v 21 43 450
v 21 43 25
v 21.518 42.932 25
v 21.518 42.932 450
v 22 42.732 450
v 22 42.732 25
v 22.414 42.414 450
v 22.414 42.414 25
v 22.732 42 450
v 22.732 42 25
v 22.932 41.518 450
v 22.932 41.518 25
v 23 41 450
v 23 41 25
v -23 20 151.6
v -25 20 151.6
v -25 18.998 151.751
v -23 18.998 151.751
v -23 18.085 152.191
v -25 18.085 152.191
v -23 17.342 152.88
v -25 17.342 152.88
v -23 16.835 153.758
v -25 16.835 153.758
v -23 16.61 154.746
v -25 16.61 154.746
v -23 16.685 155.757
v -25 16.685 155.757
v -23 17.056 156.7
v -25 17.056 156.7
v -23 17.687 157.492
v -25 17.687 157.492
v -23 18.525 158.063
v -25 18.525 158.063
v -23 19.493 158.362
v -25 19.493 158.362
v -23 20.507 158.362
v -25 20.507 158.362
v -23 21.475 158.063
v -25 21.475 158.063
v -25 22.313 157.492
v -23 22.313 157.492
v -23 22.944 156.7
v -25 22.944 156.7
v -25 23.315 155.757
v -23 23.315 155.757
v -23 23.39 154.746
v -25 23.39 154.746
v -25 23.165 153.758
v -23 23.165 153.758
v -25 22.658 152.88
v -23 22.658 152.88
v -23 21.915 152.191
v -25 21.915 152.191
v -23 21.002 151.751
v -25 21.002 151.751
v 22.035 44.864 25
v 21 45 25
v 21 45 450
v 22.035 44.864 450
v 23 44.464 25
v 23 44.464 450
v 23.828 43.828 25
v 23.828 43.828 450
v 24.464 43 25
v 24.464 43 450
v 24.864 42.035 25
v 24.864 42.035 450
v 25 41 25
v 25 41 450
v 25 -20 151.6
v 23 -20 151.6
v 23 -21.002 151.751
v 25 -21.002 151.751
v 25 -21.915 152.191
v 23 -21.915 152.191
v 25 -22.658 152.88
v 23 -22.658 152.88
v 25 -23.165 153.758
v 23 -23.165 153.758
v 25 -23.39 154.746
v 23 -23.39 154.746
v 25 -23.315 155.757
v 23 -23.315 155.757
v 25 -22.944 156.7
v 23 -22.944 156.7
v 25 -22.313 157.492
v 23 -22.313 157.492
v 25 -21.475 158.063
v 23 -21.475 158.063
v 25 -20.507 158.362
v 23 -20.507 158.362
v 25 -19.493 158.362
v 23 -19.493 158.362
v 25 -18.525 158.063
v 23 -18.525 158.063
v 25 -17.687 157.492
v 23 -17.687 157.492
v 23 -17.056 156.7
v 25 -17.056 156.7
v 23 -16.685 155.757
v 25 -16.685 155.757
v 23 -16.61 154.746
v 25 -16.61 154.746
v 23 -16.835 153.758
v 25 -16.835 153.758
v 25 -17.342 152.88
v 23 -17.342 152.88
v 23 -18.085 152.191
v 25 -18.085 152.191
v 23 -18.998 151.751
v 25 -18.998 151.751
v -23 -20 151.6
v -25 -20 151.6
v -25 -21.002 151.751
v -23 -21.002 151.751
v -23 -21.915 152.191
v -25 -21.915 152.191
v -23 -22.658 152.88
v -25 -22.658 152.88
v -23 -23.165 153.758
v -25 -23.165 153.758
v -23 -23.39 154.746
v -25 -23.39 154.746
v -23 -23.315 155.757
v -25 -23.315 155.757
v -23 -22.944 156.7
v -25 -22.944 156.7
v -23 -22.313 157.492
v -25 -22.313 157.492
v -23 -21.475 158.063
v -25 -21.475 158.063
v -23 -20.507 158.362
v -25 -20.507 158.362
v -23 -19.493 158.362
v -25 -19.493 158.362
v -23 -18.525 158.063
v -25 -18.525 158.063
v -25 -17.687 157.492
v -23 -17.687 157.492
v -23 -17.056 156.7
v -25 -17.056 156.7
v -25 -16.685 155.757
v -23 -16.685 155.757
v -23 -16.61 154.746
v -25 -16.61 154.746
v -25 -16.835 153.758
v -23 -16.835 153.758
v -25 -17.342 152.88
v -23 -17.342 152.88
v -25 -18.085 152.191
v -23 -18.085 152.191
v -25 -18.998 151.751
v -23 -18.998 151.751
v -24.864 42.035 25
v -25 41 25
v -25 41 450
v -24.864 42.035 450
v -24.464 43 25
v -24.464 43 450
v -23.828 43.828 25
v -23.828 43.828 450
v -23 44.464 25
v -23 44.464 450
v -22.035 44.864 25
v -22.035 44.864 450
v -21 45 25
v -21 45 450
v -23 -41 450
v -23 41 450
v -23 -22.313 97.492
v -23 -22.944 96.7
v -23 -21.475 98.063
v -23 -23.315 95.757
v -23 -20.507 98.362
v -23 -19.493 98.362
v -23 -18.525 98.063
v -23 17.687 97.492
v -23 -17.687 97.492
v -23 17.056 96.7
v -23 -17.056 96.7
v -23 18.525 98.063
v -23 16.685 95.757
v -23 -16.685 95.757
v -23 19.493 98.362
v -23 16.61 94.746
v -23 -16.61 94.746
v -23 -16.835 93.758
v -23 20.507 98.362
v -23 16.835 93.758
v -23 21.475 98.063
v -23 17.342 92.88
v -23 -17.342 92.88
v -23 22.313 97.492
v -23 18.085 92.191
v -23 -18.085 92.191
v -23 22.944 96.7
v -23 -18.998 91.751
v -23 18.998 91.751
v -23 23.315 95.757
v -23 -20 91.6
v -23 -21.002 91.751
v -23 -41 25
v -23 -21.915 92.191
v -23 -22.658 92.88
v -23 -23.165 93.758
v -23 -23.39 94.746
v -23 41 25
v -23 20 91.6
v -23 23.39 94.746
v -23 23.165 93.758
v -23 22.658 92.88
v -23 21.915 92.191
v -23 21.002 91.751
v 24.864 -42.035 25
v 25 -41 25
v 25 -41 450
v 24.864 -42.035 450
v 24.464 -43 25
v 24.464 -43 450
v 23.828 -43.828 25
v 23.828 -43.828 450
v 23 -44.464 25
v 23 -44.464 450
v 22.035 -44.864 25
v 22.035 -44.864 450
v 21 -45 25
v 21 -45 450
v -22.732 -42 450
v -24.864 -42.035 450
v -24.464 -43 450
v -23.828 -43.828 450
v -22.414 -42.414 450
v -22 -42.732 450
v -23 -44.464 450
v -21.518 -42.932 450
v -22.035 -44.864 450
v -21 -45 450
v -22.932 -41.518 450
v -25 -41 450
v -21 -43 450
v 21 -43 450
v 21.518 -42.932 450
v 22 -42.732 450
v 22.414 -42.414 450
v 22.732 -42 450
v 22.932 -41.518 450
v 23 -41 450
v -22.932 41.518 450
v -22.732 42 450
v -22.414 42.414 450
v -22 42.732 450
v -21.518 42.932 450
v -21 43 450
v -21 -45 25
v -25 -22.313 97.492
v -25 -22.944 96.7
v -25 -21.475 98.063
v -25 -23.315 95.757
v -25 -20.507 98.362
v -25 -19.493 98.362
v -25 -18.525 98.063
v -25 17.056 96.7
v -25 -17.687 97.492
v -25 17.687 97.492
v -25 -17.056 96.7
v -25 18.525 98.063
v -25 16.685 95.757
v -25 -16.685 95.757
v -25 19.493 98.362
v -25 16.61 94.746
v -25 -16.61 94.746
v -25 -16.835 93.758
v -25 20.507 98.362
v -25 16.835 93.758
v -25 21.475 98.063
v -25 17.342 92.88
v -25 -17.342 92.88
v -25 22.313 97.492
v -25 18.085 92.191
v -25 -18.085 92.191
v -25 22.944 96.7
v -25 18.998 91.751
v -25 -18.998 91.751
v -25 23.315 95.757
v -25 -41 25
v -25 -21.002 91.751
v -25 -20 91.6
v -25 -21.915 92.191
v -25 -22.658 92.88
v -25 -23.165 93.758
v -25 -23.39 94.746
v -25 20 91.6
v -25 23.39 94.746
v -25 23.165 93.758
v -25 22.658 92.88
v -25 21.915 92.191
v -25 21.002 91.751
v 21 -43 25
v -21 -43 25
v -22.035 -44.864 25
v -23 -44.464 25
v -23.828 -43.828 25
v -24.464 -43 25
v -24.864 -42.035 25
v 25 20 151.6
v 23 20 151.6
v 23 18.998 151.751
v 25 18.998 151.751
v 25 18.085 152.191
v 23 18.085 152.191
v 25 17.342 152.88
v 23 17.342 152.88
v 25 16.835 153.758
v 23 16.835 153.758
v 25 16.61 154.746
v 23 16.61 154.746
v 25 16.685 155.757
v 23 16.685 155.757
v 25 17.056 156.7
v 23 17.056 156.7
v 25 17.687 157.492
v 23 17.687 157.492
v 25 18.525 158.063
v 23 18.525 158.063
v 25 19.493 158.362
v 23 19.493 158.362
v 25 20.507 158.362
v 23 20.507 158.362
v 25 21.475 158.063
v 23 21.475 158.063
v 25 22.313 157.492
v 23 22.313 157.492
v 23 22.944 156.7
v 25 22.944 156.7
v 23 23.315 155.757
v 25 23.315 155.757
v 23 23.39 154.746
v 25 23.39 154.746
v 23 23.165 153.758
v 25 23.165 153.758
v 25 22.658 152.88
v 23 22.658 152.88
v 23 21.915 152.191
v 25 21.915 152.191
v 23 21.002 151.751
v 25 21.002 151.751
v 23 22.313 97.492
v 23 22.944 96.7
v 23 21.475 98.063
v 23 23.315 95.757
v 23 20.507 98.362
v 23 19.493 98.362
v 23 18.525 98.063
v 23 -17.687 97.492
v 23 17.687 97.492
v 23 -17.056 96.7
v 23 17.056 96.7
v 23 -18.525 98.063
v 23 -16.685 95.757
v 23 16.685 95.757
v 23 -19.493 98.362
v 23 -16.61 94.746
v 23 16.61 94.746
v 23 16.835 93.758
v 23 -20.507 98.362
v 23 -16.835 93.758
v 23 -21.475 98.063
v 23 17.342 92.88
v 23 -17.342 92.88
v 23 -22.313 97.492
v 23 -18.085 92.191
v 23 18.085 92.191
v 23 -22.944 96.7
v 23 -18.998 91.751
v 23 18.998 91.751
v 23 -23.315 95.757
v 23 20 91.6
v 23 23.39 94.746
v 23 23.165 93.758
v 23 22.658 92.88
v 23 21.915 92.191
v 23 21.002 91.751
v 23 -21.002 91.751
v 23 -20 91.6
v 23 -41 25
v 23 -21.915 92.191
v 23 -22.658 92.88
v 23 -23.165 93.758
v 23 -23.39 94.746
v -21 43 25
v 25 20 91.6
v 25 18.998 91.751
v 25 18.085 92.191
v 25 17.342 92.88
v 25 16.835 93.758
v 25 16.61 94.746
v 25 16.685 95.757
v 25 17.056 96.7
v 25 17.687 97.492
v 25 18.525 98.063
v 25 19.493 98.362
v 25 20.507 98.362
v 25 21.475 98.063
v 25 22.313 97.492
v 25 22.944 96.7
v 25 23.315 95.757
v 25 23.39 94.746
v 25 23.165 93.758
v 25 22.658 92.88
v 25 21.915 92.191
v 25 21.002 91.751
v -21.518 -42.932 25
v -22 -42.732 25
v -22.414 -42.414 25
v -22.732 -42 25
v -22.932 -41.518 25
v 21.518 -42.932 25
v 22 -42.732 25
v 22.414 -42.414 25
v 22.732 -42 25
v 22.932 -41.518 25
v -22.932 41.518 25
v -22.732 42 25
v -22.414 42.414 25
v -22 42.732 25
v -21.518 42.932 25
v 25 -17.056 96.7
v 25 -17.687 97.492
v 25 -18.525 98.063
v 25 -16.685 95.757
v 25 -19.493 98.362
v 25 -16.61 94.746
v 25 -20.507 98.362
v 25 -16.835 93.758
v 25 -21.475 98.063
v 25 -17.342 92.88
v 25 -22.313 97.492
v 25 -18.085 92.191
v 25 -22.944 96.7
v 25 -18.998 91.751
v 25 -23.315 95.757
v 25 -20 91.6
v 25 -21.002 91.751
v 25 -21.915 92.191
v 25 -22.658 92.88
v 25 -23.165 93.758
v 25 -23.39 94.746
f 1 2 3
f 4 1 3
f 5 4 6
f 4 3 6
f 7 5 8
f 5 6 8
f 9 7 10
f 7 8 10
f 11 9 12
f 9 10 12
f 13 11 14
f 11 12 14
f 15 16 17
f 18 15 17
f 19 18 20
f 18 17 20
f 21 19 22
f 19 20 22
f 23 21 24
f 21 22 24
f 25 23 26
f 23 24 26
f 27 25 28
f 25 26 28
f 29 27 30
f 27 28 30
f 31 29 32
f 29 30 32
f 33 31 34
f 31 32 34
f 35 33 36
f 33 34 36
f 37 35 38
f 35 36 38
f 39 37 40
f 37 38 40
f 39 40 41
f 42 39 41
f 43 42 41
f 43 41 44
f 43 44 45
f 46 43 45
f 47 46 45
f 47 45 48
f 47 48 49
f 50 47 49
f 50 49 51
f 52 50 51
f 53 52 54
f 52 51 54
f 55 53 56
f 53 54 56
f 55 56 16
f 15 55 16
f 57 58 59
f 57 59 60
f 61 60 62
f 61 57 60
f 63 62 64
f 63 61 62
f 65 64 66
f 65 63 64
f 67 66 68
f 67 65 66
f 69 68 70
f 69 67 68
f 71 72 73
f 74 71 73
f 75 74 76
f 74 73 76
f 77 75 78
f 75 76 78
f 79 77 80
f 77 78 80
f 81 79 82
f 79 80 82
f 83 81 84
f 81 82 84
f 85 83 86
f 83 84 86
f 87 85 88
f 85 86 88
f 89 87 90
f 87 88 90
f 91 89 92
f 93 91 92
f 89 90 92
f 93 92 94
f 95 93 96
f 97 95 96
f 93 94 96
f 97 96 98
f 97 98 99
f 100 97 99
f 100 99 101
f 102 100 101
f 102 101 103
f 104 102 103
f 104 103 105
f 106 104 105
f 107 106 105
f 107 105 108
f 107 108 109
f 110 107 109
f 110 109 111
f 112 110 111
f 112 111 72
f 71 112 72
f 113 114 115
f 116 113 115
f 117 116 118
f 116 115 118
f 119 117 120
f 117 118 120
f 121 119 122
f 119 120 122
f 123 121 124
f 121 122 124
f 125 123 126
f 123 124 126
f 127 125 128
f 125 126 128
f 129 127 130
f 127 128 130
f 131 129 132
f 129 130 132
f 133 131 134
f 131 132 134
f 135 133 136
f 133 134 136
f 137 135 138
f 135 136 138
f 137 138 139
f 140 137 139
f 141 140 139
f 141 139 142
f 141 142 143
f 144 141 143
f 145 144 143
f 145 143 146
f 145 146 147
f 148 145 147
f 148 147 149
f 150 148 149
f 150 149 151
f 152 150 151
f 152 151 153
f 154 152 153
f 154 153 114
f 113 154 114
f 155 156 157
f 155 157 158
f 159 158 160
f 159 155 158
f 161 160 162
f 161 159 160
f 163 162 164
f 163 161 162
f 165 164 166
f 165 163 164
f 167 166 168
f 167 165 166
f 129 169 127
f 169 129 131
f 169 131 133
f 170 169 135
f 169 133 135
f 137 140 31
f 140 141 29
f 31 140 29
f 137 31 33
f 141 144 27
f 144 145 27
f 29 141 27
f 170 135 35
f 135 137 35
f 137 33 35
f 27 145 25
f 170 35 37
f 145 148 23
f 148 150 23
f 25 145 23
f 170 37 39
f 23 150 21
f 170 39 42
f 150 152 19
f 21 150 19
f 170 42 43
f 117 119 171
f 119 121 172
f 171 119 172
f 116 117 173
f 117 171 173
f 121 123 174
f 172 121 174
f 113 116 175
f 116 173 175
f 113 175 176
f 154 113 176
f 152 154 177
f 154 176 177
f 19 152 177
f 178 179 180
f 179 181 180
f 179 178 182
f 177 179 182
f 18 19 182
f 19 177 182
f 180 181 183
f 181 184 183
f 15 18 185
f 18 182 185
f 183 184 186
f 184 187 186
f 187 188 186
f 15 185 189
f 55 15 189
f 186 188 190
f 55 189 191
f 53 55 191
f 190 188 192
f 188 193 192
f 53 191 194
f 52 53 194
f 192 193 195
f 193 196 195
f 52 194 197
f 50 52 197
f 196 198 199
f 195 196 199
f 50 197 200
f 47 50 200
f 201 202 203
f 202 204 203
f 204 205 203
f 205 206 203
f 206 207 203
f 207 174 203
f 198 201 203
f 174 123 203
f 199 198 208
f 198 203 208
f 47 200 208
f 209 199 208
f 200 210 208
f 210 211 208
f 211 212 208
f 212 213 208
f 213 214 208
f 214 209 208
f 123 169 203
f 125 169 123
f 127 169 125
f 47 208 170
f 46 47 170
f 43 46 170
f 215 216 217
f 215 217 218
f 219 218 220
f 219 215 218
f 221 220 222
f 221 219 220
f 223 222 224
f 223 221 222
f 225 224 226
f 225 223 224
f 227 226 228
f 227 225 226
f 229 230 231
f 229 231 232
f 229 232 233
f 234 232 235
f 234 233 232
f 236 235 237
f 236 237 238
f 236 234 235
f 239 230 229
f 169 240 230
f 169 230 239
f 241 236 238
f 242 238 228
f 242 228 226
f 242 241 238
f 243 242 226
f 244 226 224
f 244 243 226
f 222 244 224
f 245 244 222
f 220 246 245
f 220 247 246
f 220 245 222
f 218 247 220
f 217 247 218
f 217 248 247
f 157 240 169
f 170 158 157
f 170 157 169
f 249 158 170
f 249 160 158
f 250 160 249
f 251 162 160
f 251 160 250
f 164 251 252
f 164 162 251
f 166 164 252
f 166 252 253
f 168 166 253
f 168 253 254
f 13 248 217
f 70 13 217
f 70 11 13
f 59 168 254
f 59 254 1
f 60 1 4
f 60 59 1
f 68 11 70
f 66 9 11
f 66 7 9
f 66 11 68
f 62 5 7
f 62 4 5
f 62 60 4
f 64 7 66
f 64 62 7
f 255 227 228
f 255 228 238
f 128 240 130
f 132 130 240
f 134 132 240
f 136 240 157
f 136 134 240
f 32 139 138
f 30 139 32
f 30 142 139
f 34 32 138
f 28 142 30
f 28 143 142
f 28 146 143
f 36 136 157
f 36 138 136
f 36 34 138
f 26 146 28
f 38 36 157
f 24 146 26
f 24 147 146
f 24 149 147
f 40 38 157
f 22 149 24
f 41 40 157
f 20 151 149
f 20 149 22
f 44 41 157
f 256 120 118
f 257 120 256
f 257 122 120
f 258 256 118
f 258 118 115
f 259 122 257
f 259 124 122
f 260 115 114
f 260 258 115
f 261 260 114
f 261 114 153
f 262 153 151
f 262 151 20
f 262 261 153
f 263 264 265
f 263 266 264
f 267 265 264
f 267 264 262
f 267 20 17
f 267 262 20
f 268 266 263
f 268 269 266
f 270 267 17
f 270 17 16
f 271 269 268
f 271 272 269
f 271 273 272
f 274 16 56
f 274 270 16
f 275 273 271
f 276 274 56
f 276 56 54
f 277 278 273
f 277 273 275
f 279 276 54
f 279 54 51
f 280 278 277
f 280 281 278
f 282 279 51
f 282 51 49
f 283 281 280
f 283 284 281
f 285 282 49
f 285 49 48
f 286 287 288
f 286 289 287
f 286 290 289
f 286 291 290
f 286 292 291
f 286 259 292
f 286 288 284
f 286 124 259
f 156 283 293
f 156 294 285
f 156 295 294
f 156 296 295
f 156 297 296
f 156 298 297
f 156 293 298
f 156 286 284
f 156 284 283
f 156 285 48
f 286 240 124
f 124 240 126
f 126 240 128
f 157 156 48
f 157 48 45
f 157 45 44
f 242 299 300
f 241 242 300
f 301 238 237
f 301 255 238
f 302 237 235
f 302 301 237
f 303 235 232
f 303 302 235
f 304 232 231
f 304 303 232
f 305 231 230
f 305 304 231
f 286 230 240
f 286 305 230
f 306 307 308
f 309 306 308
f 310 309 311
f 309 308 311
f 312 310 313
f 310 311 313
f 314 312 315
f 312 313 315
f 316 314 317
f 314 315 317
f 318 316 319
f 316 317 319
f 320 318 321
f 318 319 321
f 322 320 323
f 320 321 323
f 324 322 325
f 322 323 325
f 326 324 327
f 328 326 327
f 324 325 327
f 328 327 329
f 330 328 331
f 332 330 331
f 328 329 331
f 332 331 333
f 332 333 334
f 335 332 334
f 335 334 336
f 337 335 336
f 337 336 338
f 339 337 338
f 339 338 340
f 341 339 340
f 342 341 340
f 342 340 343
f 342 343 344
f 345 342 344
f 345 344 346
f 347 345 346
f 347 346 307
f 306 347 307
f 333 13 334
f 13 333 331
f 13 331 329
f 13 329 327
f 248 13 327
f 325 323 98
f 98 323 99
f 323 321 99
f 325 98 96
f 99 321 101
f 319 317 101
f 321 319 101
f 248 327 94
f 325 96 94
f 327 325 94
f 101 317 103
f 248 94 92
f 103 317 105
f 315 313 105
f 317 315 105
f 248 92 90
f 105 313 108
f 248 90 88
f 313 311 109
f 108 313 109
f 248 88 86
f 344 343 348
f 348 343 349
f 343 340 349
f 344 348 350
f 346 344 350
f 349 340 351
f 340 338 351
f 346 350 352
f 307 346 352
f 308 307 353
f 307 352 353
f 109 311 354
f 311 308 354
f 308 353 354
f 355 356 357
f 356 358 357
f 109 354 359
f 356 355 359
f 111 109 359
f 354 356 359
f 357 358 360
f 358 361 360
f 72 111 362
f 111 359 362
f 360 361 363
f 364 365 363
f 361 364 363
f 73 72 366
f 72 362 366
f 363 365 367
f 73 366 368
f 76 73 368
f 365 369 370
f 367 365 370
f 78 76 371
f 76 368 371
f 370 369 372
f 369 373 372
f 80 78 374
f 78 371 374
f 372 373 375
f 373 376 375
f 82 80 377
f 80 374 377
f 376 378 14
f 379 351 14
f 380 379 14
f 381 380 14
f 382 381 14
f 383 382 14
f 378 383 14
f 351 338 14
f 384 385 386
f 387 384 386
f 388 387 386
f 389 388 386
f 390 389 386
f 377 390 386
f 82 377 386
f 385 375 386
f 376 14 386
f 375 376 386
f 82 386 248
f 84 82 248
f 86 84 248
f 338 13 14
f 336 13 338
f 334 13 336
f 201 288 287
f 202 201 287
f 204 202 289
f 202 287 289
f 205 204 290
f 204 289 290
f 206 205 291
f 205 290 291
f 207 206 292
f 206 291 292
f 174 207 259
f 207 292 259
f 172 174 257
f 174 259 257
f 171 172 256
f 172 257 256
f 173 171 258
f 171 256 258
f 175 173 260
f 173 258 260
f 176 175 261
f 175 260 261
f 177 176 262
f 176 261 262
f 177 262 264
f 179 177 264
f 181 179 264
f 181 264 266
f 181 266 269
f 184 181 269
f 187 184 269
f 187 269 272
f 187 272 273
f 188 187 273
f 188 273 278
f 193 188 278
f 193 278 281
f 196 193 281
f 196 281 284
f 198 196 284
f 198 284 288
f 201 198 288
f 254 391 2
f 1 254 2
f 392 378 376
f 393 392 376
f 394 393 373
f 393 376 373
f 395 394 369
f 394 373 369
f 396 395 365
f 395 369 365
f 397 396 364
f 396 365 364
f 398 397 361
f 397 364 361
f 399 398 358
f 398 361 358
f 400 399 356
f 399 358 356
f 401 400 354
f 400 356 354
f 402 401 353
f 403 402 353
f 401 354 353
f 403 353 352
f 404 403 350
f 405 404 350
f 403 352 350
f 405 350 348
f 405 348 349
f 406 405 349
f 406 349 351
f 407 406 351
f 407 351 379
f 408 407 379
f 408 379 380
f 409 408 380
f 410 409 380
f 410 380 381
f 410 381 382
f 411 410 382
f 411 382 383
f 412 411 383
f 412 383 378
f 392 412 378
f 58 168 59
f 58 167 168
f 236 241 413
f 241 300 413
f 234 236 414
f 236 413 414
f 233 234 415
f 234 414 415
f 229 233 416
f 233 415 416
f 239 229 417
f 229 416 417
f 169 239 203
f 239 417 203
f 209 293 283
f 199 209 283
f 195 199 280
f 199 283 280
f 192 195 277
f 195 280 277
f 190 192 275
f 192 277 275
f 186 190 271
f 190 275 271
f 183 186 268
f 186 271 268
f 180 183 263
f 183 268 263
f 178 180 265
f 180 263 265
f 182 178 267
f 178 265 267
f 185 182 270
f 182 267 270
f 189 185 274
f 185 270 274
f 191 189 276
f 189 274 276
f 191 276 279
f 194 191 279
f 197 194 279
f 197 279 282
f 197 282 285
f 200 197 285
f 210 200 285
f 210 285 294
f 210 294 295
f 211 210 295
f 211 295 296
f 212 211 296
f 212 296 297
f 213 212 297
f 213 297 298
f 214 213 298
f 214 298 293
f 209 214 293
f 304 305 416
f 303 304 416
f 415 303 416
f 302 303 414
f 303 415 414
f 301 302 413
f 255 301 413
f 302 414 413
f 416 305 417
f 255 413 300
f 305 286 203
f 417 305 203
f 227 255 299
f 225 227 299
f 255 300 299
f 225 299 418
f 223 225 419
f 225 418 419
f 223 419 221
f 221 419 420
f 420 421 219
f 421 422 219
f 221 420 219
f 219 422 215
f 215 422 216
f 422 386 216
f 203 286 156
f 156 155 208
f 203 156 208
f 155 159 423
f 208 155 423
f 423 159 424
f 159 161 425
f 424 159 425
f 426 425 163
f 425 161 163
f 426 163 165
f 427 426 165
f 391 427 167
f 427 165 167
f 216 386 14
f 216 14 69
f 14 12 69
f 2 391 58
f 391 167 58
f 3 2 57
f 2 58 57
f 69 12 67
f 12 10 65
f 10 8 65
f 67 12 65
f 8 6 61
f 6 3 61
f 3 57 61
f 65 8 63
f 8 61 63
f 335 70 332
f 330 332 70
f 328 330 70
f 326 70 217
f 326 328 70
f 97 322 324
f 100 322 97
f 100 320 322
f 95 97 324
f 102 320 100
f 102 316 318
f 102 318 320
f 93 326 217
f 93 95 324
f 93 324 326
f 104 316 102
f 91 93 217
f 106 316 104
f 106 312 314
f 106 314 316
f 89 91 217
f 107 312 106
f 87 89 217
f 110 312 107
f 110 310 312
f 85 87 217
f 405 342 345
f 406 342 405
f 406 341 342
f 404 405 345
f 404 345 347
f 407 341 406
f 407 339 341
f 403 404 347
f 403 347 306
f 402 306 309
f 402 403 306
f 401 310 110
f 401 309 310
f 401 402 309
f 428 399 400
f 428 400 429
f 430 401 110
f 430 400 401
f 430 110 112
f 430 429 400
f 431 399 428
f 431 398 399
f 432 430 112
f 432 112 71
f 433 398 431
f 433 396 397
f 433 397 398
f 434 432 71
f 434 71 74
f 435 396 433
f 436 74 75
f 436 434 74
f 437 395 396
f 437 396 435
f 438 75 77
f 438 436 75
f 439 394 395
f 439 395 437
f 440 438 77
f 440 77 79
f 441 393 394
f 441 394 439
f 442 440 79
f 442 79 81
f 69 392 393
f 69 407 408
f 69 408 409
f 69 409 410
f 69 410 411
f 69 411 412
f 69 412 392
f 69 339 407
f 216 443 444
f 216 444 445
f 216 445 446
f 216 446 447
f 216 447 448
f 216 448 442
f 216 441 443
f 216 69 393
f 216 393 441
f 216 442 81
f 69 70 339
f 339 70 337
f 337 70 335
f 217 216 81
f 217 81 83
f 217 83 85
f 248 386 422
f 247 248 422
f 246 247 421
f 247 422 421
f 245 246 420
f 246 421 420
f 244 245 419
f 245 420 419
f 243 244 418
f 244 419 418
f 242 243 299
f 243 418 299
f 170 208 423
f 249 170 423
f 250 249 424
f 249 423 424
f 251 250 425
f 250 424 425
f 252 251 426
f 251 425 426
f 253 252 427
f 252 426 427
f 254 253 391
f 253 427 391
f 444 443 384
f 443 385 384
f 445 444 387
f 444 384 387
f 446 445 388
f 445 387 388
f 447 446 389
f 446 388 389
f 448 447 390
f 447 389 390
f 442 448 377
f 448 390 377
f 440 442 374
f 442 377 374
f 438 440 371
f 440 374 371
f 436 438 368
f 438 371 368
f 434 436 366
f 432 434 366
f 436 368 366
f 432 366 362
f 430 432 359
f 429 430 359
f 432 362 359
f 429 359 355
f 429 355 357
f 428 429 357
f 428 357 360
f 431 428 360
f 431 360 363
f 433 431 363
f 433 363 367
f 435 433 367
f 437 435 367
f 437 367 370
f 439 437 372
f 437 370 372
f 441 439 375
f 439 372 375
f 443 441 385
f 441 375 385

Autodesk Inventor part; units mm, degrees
ref_plane "Start Plane" through (0, 0, 25) normal (0, 0, 1) x (1, 0, 0)
ref_plane "End Plane" through (0, 0, 450) normal (0, 0, 1) x (1, 0, 0)
sketch "Sketch" plane through (0, 0, 0) normal (0, 0, 1) x (1, 0, 0)
  line L0 (-25, -41) -> (-25, 41)
  line L1 (-21, 45) -> (21, 45)
  line L2 (25, 41) -> (25, -41)
  line L3 (21, -45) -> (-21, -45)
  arc A0 (-25, -41) -> (-21, -45) centre (-21, -41) ccw
  arc A1 (25, 41) -> (21, 45) centre (21, 41) ccw
  arc A2 (-21, 45) -> (-25, 41) centre (-21, 41) ccw
  arc A3 (21, -45) -> (25, -41) centre (21, -41) ccw
  arc A4 (-21, 43) -> (-23, 41) centre (-21, 41) ccw
  line L4 (-21, 43) -> (21, 43)
  arc A5 (23, 41) -> (21, 43) centre (21, 41) ccw
  line L5 (23, 41) -> (23, -41)
  arc A6 (21, -43) -> (23, -41) centre (21, -41) ccw
  line L6 (21, -43) -> (-21, -43)
  arc A7 (-23, -41) -> (-21, -43) centre (-21, -41) ccw
  line L7 (-23, -41) -> (-23, 41)
  line L8 (0, 64.1598) -> (0, -64.1598) construction
  line L9 (-36.1598, 0) -> (36.1598, 0) construction
  dimension "d7" = 4
  dimension "d9" = 50
  dimension "d11" = 90
  dimension "d12" = 2
  dimension "d15" = 25
  dimension "d16" = 45
extrude "Body" add sketch "Sketch" along normal up to surface (425 mm away) from surface at 25
sketch "Sketch3" plane through (0, 0, 0) normal (0, 0, 1) x (1, 0, 0)
  line L0 (0, 0) -> (10, 0)
ref_plane "Work Plane3" through (0, 0, 0) normal (0, -1, 0) x (1, 0, 0)
sketch "Sketch4" plane through (0, 0, 0) normal (0, -1, 0) x (1, 0, 0)
  line L0 (-2, 25) -> (12, 25)
  line L1 (-2, 450) -> (12, 450)
  dimension "d18" = 425
ref_plane "Work Plane4" through (21, -20, 25) normal (0, 0, -1) x (-1, 0, 0)
split "Split1" plane through (21, -20, 25) removes the side toward (0, 0, -1)
sketch "Sketch5" plane through (25, -41, 450) normal (1, 0, 0) x (0, 0, -1)
  line L0 (425, 82) -> (425, 0) projected
  line L1 (295, 61) -> (355, 61)
  line L2 (355, 61) -> (355, 21)
  line L3 (355, 21) -> (295, 21)
  line L4 (295, 21) -> (295, 61)
  line L5 (425, 41) -> (406.5114, 41)
  point P0 (450, 41)
  dimension "d19" = 60
  dimension "d20" = 40
  dimension "d21" = 70
hole "Hole1" at (25, 20, 155) at (25, -20, 155) at (25, -20, 95) at (25, 20, 95) direction (-1, 0, 0) diameter 6.8 end through all
equation "\"d7\" = G_IR"
equation "\"d9\" = G_W"
equation "\"d11\" = G_H"
equation "\"d12\" = G_T"
equation "\"d15\" = 0.5 * d9"
equation "\"d16\" = 0.5 * d11"
equation "\"d3\" = G_L"
equation "\"G_W\" = 50"
equation "\"G_H\" = 90"
equation "\"G_T\" = 2"
equation "\"G_IR\" = 4"
equation "\"G_L\" = d18"
equation "\"G_OFFSET_START\" = -25"
equation "\"G_OFFSET_END\" = 0"
equation "\"d13\" = -G_OFFSET_START"
properties part number "ISO 10799-2 - 90x50x2 - 425" material "Steel, Mild"
